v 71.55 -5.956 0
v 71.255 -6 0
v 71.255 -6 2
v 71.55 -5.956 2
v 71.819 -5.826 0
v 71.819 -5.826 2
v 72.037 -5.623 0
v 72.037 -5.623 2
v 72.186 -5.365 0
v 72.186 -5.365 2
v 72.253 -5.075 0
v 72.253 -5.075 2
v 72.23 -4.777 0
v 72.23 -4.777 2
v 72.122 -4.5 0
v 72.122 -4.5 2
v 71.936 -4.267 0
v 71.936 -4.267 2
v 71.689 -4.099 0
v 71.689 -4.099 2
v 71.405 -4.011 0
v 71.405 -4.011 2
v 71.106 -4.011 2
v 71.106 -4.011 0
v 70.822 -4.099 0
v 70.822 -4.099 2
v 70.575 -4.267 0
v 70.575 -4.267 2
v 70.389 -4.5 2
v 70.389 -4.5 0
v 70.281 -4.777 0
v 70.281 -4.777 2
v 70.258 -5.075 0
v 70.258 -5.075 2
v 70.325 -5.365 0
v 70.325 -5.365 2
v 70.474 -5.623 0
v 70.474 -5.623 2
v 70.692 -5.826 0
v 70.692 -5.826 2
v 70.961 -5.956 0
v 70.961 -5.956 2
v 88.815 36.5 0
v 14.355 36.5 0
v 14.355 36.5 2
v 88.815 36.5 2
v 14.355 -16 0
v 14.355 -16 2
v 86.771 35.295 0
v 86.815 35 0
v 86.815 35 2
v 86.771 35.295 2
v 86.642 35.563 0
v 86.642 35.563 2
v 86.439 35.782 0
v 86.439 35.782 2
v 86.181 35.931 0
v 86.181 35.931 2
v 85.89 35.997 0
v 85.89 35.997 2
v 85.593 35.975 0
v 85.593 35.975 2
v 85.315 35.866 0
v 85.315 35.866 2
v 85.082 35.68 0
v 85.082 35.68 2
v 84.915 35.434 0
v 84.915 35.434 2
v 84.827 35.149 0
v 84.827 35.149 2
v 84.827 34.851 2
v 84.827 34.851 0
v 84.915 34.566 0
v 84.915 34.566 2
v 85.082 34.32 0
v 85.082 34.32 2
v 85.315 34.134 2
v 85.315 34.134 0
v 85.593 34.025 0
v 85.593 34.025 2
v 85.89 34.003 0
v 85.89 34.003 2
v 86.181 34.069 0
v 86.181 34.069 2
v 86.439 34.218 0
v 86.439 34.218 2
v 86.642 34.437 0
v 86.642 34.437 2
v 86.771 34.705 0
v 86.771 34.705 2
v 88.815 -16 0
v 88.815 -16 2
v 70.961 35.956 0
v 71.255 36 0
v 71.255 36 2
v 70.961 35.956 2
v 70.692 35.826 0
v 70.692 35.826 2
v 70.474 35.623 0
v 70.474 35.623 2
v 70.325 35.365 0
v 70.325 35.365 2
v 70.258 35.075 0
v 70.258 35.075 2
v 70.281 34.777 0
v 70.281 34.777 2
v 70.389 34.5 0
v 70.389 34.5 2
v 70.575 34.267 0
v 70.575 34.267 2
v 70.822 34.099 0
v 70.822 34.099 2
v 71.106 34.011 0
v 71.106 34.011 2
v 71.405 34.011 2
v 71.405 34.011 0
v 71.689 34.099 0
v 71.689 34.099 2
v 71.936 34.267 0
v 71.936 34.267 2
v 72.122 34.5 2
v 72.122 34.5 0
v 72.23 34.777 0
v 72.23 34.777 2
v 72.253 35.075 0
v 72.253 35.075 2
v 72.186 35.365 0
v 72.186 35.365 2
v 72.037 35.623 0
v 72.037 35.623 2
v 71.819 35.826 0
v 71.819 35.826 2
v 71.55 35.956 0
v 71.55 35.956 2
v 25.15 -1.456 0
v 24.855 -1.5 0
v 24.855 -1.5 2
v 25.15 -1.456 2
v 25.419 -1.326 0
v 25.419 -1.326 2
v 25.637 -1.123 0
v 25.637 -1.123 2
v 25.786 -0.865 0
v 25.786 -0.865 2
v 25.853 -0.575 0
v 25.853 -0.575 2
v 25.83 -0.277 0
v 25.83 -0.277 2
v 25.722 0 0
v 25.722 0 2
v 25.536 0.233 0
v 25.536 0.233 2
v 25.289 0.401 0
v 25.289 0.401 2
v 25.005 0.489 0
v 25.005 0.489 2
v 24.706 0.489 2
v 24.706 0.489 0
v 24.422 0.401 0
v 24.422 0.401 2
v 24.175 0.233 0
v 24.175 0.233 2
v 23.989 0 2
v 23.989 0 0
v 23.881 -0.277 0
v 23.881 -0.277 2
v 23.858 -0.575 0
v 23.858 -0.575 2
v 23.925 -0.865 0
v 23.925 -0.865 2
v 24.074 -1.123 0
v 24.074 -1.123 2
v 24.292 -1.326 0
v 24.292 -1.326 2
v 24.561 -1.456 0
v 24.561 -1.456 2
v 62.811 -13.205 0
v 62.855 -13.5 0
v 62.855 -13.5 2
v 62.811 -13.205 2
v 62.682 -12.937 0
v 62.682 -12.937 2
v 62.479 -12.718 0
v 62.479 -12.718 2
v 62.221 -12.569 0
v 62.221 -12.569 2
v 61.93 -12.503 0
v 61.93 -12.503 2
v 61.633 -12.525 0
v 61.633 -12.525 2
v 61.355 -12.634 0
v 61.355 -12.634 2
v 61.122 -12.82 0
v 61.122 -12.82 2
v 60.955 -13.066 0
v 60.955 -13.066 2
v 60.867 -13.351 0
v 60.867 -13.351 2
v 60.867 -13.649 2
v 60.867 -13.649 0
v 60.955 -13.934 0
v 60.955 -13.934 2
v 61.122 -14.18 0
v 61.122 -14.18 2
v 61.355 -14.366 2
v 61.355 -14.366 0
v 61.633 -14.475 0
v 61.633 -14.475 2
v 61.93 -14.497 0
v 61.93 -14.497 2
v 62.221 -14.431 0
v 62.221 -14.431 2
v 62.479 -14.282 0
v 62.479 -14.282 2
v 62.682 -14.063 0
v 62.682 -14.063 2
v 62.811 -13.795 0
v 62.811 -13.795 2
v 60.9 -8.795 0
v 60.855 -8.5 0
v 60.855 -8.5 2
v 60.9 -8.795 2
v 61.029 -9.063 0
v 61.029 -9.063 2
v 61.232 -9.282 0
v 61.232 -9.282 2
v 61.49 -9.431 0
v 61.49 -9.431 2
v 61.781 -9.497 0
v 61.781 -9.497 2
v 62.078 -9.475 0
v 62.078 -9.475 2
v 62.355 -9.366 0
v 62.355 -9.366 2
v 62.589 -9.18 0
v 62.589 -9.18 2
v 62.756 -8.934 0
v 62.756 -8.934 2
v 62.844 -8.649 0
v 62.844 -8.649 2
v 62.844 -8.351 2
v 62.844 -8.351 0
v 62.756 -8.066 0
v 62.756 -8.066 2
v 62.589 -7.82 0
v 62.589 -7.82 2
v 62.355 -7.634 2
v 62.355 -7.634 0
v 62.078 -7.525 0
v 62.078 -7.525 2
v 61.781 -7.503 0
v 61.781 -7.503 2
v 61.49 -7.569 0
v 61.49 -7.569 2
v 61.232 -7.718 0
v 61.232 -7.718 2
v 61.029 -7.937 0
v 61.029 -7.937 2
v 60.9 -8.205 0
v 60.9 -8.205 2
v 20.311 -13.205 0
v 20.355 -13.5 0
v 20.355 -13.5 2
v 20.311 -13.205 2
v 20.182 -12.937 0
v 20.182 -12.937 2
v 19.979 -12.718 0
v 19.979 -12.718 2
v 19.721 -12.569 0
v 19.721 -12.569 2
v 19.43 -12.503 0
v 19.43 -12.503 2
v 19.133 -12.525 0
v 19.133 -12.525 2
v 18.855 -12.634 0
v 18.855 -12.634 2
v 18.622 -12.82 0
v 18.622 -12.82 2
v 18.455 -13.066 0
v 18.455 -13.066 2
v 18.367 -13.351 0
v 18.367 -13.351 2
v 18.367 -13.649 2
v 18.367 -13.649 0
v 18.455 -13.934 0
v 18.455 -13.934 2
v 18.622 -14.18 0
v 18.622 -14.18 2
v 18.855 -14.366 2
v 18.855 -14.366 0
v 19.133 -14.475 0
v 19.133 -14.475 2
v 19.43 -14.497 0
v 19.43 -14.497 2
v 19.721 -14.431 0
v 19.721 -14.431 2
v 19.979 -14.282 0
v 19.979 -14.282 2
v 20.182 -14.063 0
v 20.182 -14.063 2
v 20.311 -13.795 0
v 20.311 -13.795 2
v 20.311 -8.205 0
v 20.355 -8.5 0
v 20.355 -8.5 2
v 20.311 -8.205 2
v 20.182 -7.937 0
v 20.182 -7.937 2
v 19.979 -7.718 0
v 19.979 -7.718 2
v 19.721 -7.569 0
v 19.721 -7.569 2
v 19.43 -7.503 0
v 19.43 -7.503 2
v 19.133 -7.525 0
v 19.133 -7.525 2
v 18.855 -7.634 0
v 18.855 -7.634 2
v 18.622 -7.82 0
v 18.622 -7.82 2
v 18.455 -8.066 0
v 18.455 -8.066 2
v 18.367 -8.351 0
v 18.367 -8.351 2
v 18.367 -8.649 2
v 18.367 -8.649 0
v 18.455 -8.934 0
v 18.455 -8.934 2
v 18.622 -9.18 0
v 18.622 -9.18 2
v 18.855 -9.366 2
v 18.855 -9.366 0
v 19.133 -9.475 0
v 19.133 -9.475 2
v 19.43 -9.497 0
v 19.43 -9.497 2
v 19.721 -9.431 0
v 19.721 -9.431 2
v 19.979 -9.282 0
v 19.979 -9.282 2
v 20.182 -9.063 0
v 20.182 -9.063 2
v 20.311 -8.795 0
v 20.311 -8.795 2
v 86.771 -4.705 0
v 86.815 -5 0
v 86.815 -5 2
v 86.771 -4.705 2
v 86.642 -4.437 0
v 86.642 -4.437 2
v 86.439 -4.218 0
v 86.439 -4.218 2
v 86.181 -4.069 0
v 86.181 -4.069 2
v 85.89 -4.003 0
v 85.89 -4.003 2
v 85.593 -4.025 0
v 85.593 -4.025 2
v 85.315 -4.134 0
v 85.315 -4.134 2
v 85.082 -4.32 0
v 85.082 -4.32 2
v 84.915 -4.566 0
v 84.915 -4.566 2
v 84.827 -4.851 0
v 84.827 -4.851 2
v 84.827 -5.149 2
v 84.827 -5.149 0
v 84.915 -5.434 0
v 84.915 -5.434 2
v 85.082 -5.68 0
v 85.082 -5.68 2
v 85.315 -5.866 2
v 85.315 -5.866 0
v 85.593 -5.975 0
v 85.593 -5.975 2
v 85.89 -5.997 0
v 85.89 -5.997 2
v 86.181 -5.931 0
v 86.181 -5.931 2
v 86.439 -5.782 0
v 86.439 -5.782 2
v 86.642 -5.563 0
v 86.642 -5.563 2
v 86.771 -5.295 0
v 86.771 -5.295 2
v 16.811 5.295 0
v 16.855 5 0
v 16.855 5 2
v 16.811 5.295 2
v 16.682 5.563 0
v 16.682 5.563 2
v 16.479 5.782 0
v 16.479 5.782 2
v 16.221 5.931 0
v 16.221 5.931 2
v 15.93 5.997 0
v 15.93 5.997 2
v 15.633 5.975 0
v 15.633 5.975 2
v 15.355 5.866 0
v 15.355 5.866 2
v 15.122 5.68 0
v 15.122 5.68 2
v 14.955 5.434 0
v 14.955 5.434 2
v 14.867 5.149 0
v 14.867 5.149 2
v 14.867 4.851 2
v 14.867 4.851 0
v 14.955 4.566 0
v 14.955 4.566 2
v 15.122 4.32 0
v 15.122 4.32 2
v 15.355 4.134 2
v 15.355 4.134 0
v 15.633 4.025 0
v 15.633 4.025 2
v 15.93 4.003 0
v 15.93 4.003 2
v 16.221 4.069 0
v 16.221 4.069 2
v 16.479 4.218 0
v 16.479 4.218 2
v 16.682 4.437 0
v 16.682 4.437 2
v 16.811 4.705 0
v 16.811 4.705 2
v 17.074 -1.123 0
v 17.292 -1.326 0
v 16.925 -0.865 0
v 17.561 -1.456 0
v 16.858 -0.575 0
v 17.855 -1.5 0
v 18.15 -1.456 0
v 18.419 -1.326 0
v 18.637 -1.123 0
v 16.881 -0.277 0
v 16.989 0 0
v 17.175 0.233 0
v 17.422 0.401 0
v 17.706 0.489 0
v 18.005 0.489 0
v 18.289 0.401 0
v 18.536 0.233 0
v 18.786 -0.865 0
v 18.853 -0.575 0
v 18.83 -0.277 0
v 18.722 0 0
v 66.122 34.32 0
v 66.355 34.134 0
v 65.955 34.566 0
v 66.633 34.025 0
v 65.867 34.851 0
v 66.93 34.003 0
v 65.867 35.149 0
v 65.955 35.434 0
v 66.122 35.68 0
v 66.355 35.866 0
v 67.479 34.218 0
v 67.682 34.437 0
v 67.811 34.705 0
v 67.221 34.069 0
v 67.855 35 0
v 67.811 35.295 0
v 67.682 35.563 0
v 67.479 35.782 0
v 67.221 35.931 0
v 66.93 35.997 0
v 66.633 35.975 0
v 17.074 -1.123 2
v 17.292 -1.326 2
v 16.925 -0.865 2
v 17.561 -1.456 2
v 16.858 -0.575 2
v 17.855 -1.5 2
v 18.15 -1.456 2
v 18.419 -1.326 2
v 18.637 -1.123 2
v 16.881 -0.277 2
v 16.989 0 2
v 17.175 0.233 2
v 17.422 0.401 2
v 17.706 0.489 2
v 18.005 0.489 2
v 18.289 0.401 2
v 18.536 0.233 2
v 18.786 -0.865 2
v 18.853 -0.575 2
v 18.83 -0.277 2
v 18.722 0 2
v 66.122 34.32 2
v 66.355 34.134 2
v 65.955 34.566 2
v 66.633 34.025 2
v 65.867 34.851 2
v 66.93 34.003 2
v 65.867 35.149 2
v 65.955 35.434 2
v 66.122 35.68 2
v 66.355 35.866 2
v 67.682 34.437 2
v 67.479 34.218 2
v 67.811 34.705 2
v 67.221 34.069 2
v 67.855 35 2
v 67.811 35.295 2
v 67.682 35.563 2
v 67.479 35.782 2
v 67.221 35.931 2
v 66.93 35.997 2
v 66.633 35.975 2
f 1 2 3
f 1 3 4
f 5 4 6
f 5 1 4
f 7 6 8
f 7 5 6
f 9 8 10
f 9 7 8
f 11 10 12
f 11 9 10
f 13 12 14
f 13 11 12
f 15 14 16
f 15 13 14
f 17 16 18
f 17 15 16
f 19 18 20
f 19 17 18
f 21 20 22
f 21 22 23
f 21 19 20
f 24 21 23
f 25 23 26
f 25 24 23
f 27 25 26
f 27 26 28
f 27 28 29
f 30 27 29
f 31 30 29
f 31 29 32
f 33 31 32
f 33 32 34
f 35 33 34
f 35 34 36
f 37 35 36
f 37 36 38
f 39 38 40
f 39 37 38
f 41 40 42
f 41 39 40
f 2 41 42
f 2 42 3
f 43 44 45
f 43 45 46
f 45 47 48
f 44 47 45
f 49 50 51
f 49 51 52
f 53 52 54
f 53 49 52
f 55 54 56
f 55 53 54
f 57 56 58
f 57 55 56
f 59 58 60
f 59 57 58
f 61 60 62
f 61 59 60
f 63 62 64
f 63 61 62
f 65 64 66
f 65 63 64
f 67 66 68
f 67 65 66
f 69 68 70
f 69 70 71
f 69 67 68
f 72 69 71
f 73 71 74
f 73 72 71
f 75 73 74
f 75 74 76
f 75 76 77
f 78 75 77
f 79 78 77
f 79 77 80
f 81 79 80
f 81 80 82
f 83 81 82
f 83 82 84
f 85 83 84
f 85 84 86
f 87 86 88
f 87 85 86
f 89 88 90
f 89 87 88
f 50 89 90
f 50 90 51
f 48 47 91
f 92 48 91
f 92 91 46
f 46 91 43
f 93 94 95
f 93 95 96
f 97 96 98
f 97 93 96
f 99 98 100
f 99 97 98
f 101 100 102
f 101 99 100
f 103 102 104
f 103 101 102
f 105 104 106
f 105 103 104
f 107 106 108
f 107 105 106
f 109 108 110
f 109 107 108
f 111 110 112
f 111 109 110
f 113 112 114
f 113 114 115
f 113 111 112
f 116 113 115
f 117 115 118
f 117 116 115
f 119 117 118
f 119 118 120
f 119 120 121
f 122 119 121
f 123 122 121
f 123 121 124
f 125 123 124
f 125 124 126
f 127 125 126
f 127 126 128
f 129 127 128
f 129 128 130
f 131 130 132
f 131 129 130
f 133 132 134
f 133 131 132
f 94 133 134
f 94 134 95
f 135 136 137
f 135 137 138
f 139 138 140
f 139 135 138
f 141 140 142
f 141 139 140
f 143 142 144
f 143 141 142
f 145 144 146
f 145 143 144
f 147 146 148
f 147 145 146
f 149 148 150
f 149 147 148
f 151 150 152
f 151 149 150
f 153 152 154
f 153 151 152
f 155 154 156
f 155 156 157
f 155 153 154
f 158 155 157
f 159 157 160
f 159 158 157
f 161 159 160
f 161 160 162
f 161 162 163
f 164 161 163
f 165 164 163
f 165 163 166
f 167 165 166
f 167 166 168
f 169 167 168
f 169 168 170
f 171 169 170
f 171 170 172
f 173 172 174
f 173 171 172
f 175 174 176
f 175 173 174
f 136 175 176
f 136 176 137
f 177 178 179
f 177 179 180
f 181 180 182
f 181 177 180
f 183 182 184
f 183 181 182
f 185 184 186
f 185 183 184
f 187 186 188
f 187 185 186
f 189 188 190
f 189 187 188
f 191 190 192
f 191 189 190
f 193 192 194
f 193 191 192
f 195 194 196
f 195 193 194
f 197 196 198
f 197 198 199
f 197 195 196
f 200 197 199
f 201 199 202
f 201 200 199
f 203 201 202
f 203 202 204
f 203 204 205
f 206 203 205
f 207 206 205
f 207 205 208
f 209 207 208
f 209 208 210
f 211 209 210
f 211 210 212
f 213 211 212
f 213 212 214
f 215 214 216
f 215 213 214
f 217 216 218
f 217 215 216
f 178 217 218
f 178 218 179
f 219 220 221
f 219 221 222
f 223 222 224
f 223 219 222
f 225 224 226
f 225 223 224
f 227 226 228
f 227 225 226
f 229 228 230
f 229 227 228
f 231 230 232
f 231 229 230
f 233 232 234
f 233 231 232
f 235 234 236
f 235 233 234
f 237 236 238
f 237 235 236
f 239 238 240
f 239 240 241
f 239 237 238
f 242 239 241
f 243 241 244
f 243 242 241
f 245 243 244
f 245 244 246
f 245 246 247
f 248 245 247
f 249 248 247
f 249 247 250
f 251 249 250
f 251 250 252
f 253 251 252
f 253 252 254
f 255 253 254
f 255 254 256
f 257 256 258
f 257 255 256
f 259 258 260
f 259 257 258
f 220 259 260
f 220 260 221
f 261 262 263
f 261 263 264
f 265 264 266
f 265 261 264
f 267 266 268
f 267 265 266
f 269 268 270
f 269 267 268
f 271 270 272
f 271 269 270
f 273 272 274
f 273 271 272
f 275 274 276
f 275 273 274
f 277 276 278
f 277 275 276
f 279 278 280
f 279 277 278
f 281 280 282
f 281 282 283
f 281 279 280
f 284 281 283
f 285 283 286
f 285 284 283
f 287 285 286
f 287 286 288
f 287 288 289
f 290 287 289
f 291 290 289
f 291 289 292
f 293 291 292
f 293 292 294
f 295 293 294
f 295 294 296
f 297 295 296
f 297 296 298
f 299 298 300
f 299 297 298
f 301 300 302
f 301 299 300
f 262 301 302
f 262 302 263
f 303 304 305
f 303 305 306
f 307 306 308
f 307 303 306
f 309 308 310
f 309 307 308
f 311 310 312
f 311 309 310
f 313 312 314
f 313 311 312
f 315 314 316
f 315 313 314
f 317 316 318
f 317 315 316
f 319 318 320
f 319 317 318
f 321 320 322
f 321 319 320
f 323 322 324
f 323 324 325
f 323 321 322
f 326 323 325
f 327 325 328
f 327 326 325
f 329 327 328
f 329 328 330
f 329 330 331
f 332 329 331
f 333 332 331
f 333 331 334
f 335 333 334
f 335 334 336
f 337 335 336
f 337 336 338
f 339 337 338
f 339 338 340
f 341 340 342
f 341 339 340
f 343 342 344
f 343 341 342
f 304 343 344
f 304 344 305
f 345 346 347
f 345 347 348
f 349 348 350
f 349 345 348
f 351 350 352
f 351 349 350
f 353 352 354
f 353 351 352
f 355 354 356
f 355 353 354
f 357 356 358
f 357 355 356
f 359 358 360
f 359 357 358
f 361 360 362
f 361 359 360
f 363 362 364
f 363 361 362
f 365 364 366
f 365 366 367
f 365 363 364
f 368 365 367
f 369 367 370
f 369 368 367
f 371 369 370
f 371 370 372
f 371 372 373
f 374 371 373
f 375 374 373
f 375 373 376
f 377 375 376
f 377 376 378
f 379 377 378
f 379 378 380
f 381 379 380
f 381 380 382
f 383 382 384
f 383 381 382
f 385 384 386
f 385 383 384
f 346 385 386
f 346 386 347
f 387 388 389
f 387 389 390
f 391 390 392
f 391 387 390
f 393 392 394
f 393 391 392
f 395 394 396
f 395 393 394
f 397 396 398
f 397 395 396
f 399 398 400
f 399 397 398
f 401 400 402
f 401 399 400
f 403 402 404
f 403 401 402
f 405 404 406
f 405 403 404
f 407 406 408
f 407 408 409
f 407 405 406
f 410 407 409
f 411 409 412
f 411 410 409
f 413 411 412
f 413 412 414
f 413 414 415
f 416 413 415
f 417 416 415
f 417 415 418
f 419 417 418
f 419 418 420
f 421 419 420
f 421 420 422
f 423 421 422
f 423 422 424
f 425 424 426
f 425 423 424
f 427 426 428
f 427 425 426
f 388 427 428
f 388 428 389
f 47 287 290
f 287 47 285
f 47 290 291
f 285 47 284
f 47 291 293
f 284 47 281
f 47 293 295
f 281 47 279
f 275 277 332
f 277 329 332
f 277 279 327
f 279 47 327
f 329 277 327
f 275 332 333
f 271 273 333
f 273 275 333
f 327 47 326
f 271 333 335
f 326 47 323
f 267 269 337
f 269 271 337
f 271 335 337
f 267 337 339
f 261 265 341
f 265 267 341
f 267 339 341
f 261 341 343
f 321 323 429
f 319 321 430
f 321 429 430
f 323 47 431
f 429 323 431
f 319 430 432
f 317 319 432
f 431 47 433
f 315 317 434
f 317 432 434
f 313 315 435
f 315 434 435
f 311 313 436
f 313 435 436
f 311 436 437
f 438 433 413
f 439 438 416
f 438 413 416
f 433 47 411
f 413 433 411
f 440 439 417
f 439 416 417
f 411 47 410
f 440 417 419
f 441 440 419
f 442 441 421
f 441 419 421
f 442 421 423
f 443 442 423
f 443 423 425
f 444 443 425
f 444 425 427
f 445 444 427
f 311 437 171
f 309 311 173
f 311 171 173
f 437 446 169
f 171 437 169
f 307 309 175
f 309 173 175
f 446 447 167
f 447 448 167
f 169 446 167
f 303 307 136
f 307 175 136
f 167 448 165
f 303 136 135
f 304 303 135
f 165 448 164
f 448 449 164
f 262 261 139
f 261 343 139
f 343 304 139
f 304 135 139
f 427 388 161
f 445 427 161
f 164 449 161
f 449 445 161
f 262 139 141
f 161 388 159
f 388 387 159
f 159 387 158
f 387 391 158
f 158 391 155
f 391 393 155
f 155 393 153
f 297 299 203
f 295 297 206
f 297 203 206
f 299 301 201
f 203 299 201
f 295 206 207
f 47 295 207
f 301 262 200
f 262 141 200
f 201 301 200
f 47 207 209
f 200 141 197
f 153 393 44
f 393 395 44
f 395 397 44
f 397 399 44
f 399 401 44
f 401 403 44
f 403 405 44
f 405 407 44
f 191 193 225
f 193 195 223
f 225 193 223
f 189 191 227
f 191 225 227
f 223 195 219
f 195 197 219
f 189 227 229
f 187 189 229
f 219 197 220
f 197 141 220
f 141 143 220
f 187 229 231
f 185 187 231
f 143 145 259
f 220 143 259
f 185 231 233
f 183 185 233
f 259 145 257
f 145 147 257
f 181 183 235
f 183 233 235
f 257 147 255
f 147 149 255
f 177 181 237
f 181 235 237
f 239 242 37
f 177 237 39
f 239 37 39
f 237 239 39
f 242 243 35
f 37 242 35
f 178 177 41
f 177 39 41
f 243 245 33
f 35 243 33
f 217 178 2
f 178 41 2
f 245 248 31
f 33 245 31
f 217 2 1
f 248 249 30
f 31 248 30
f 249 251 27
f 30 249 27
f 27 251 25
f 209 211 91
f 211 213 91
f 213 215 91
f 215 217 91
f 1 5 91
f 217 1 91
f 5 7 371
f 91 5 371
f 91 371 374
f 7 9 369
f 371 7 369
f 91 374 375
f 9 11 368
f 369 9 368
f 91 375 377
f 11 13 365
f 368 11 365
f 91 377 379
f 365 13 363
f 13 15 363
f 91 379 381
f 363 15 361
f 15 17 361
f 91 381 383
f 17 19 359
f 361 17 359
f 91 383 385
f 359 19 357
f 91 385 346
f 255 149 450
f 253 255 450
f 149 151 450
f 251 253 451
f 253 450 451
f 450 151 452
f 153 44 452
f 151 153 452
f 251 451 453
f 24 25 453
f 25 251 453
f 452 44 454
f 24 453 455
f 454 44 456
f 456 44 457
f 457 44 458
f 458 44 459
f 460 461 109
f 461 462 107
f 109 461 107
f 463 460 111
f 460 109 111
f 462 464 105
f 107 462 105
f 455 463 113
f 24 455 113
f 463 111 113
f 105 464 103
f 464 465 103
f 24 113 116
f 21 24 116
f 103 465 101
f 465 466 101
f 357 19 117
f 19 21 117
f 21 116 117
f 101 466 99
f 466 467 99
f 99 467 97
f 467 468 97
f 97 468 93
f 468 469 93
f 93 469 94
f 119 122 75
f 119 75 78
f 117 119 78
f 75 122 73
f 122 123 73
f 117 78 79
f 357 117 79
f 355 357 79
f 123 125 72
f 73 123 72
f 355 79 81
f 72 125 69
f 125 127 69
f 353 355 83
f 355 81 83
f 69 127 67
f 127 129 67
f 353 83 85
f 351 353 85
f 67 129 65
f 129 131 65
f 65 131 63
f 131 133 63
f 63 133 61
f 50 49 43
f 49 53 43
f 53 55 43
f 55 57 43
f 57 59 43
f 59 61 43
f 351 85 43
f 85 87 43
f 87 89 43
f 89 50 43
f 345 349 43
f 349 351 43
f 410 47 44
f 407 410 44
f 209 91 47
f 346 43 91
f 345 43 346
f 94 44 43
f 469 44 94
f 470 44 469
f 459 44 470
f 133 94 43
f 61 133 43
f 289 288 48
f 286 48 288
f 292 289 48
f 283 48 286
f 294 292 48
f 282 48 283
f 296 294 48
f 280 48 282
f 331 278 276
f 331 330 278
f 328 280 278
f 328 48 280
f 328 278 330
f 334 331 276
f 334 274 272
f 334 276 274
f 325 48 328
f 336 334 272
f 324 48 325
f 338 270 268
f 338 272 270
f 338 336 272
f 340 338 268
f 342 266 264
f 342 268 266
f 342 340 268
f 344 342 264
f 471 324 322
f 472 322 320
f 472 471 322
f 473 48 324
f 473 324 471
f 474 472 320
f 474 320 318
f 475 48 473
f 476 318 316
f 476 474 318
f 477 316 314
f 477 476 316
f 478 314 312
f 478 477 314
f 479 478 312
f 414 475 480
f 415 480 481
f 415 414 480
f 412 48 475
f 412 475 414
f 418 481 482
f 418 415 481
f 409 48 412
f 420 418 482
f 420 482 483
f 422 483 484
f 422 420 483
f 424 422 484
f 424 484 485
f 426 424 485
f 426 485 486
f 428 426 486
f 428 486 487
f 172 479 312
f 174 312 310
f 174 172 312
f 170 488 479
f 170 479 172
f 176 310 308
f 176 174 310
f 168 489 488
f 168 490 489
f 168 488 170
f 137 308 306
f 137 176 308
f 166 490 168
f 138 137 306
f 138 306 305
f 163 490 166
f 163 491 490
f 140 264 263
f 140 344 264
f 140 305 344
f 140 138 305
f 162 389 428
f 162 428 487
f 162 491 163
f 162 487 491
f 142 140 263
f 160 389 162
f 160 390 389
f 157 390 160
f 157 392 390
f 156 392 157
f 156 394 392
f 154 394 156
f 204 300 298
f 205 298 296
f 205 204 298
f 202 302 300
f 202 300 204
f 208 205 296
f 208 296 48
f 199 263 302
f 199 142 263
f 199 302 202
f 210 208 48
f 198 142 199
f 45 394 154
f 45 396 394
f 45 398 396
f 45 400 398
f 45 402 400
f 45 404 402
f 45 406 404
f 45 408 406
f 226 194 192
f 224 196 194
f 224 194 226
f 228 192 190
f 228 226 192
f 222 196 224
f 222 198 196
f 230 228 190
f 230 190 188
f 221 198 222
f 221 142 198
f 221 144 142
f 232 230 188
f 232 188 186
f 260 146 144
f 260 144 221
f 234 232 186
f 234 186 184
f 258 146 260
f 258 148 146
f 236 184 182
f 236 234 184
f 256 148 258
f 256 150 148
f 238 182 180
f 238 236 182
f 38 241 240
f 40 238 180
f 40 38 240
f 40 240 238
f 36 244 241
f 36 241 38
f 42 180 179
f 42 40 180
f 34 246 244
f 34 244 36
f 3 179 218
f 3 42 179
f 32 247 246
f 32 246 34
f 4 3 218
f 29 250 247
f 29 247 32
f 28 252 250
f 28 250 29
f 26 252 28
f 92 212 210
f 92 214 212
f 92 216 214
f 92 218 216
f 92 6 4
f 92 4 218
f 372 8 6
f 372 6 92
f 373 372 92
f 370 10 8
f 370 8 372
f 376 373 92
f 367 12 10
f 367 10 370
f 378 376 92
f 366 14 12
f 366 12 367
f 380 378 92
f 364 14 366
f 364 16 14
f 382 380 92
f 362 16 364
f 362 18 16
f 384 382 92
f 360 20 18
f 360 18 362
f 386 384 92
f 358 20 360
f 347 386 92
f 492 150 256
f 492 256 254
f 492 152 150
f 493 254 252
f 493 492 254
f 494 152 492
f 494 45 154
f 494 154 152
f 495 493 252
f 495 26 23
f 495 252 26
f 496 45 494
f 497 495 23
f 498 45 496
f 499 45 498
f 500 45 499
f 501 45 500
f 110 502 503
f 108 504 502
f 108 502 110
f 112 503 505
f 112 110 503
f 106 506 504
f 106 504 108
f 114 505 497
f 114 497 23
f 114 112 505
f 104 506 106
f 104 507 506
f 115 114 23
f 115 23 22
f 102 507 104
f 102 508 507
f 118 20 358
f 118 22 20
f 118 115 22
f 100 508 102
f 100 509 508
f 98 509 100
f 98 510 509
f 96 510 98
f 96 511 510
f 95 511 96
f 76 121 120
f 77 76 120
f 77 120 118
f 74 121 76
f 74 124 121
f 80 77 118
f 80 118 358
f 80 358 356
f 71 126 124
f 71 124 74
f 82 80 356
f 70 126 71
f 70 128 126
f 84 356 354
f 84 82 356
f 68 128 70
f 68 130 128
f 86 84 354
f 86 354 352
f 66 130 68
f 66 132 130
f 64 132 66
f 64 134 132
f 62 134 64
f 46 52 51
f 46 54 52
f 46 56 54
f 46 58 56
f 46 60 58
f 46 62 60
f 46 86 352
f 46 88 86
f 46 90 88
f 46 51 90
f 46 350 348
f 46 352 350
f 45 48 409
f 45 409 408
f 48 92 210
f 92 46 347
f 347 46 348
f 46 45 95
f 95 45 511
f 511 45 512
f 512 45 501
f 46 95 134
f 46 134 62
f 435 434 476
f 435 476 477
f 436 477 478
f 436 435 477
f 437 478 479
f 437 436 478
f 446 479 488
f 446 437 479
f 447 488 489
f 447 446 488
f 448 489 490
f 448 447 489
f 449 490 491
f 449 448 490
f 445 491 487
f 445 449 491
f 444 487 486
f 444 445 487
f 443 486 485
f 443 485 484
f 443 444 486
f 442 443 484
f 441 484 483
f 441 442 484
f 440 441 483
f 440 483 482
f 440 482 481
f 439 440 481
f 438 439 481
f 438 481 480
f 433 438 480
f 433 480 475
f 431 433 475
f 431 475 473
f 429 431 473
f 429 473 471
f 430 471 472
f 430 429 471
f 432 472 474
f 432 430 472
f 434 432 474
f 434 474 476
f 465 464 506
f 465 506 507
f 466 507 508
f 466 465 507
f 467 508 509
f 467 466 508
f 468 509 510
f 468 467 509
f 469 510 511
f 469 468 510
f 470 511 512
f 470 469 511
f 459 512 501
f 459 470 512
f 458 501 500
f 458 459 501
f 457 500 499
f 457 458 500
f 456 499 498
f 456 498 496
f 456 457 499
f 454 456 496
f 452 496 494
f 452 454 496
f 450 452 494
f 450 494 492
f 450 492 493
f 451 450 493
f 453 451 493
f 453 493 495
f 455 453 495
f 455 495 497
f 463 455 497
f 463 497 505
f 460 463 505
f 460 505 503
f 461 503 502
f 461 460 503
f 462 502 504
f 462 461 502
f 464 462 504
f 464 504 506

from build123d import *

# Parameters (mm, degrees)
SKETCH2_W           = 74.46
SKETCH2_H           = 52.500000064
SKETCH2_R           = 1
BOSS_EXTRUDE1_DEPTH = 2


with BuildPart() as part:
    # Sketch2 → Boss-Extrude1 (new body)
    with BuildSketch(Plane.XY):
        with Locations((51.585490461, 10.250000032)):
            Rectangle(SKETCH2_W, SKETCH2_H)
        with Locations((66.855490461, 35.000000064)):
            Circle(SKETCH2_R, mode=Mode.SUBTRACT)
        with Locations((15.855490461, 5.000000064)):
            Circle(SKETCH2_R, mode=Mode.SUBTRACT)
        with Locations((85.815490461, 35.000000064)):
            Circle(SKETCH2_R, mode=Mode.SUBTRACT)
        with Locations((85.815490461, -5.000000191)):
            Circle(SKETCH2_R, mode=Mode.SUBTRACT)
        with BuildLine():
            ThreePointArc((71.255490461, -4.000000191), (70.255490461, -5.000000191), (71.255490461, -6.000000191))
            ThreePointArc((71.255490461, -6.000000191), (72.255490461, -5.000000191), (71.255490461, -4.000000191))
        make_face(mode=Mode.SUBTRACT)
        with BuildLine():
            ThreePointArc((18.355490461, -13.5), (19.355490461, -14.5), (20.355490461, -13.5))
            ThreePointArc((20.355490461, -13.5), (19.355490461, -12.5), (18.355490461, -13.5))
        make_face(mode=Mode.SUBTRACT)
        with BuildLine():
            ThreePointArc((18.355490461, -8.5), (19.355490461, -9.5), (20.355490461, -8.5))
            ThreePointArc((20.355490461, -8.5), (19.355490461, -7.5), (18.355490461, -8.5))
        make_face(mode=Mode.SUBTRACT)
        with BuildLine():
            ThreePointArc((17.855490461, 0.500000064), (16.855490461, -0.499999936), (17.855490461, -1.499999936))
            ThreePointArc((17.855490461, -1.499999936), (18.855490461, -0.499999936), (17.855490461, 0.500000064))
        make_face(mode=Mode.SUBTRACT)
        with BuildLine():
            ThreePointArc((24.855490461, 0.500000064), (23.855490461, -0.499999936), (24.855490461, -1.499999936))
            ThreePointArc((24.855490461, -1.499999936), (25.855490461, -0.499999936), (24.855490461, 0.500000064))
        make_face(mode=Mode.SUBTRACT)
        with BuildLine():
            ThreePointArc((60.855490461, -13.5), (61.855490461, -14.5), (62.855490461, -13.5))
            ThreePointArc((62.855490461, -13.5), (61.855490461, -12.5), (60.855490461, -13.5))
        make_face(mode=Mode.SUBTRACT)
        with BuildLine():
            ThreePointArc((62.855490461, -8.5), (61.855490461, -7.5), (60.855490461, -8.5))
            ThreePointArc((60.855490461, -8.5), (61.855490461, -9.5), (62.855490461, -8.5))
        make_face(mode=Mode.SUBTRACT)
        with BuildLine():
            ThreePointArc((71.255490461, 34.000000064), (72.255490461, 35.000000064), (71.255490461, 36.000000064))
            ThreePointArc((71.255490461, 36.000000064), (70.255490461, 35.000000064), (71.255490461, 34.000000064))
        make_face(mode=Mode.SUBTRACT)
    extrude(amount=BOSS_EXTRUDE1_DEPTH)


solid = part.part
